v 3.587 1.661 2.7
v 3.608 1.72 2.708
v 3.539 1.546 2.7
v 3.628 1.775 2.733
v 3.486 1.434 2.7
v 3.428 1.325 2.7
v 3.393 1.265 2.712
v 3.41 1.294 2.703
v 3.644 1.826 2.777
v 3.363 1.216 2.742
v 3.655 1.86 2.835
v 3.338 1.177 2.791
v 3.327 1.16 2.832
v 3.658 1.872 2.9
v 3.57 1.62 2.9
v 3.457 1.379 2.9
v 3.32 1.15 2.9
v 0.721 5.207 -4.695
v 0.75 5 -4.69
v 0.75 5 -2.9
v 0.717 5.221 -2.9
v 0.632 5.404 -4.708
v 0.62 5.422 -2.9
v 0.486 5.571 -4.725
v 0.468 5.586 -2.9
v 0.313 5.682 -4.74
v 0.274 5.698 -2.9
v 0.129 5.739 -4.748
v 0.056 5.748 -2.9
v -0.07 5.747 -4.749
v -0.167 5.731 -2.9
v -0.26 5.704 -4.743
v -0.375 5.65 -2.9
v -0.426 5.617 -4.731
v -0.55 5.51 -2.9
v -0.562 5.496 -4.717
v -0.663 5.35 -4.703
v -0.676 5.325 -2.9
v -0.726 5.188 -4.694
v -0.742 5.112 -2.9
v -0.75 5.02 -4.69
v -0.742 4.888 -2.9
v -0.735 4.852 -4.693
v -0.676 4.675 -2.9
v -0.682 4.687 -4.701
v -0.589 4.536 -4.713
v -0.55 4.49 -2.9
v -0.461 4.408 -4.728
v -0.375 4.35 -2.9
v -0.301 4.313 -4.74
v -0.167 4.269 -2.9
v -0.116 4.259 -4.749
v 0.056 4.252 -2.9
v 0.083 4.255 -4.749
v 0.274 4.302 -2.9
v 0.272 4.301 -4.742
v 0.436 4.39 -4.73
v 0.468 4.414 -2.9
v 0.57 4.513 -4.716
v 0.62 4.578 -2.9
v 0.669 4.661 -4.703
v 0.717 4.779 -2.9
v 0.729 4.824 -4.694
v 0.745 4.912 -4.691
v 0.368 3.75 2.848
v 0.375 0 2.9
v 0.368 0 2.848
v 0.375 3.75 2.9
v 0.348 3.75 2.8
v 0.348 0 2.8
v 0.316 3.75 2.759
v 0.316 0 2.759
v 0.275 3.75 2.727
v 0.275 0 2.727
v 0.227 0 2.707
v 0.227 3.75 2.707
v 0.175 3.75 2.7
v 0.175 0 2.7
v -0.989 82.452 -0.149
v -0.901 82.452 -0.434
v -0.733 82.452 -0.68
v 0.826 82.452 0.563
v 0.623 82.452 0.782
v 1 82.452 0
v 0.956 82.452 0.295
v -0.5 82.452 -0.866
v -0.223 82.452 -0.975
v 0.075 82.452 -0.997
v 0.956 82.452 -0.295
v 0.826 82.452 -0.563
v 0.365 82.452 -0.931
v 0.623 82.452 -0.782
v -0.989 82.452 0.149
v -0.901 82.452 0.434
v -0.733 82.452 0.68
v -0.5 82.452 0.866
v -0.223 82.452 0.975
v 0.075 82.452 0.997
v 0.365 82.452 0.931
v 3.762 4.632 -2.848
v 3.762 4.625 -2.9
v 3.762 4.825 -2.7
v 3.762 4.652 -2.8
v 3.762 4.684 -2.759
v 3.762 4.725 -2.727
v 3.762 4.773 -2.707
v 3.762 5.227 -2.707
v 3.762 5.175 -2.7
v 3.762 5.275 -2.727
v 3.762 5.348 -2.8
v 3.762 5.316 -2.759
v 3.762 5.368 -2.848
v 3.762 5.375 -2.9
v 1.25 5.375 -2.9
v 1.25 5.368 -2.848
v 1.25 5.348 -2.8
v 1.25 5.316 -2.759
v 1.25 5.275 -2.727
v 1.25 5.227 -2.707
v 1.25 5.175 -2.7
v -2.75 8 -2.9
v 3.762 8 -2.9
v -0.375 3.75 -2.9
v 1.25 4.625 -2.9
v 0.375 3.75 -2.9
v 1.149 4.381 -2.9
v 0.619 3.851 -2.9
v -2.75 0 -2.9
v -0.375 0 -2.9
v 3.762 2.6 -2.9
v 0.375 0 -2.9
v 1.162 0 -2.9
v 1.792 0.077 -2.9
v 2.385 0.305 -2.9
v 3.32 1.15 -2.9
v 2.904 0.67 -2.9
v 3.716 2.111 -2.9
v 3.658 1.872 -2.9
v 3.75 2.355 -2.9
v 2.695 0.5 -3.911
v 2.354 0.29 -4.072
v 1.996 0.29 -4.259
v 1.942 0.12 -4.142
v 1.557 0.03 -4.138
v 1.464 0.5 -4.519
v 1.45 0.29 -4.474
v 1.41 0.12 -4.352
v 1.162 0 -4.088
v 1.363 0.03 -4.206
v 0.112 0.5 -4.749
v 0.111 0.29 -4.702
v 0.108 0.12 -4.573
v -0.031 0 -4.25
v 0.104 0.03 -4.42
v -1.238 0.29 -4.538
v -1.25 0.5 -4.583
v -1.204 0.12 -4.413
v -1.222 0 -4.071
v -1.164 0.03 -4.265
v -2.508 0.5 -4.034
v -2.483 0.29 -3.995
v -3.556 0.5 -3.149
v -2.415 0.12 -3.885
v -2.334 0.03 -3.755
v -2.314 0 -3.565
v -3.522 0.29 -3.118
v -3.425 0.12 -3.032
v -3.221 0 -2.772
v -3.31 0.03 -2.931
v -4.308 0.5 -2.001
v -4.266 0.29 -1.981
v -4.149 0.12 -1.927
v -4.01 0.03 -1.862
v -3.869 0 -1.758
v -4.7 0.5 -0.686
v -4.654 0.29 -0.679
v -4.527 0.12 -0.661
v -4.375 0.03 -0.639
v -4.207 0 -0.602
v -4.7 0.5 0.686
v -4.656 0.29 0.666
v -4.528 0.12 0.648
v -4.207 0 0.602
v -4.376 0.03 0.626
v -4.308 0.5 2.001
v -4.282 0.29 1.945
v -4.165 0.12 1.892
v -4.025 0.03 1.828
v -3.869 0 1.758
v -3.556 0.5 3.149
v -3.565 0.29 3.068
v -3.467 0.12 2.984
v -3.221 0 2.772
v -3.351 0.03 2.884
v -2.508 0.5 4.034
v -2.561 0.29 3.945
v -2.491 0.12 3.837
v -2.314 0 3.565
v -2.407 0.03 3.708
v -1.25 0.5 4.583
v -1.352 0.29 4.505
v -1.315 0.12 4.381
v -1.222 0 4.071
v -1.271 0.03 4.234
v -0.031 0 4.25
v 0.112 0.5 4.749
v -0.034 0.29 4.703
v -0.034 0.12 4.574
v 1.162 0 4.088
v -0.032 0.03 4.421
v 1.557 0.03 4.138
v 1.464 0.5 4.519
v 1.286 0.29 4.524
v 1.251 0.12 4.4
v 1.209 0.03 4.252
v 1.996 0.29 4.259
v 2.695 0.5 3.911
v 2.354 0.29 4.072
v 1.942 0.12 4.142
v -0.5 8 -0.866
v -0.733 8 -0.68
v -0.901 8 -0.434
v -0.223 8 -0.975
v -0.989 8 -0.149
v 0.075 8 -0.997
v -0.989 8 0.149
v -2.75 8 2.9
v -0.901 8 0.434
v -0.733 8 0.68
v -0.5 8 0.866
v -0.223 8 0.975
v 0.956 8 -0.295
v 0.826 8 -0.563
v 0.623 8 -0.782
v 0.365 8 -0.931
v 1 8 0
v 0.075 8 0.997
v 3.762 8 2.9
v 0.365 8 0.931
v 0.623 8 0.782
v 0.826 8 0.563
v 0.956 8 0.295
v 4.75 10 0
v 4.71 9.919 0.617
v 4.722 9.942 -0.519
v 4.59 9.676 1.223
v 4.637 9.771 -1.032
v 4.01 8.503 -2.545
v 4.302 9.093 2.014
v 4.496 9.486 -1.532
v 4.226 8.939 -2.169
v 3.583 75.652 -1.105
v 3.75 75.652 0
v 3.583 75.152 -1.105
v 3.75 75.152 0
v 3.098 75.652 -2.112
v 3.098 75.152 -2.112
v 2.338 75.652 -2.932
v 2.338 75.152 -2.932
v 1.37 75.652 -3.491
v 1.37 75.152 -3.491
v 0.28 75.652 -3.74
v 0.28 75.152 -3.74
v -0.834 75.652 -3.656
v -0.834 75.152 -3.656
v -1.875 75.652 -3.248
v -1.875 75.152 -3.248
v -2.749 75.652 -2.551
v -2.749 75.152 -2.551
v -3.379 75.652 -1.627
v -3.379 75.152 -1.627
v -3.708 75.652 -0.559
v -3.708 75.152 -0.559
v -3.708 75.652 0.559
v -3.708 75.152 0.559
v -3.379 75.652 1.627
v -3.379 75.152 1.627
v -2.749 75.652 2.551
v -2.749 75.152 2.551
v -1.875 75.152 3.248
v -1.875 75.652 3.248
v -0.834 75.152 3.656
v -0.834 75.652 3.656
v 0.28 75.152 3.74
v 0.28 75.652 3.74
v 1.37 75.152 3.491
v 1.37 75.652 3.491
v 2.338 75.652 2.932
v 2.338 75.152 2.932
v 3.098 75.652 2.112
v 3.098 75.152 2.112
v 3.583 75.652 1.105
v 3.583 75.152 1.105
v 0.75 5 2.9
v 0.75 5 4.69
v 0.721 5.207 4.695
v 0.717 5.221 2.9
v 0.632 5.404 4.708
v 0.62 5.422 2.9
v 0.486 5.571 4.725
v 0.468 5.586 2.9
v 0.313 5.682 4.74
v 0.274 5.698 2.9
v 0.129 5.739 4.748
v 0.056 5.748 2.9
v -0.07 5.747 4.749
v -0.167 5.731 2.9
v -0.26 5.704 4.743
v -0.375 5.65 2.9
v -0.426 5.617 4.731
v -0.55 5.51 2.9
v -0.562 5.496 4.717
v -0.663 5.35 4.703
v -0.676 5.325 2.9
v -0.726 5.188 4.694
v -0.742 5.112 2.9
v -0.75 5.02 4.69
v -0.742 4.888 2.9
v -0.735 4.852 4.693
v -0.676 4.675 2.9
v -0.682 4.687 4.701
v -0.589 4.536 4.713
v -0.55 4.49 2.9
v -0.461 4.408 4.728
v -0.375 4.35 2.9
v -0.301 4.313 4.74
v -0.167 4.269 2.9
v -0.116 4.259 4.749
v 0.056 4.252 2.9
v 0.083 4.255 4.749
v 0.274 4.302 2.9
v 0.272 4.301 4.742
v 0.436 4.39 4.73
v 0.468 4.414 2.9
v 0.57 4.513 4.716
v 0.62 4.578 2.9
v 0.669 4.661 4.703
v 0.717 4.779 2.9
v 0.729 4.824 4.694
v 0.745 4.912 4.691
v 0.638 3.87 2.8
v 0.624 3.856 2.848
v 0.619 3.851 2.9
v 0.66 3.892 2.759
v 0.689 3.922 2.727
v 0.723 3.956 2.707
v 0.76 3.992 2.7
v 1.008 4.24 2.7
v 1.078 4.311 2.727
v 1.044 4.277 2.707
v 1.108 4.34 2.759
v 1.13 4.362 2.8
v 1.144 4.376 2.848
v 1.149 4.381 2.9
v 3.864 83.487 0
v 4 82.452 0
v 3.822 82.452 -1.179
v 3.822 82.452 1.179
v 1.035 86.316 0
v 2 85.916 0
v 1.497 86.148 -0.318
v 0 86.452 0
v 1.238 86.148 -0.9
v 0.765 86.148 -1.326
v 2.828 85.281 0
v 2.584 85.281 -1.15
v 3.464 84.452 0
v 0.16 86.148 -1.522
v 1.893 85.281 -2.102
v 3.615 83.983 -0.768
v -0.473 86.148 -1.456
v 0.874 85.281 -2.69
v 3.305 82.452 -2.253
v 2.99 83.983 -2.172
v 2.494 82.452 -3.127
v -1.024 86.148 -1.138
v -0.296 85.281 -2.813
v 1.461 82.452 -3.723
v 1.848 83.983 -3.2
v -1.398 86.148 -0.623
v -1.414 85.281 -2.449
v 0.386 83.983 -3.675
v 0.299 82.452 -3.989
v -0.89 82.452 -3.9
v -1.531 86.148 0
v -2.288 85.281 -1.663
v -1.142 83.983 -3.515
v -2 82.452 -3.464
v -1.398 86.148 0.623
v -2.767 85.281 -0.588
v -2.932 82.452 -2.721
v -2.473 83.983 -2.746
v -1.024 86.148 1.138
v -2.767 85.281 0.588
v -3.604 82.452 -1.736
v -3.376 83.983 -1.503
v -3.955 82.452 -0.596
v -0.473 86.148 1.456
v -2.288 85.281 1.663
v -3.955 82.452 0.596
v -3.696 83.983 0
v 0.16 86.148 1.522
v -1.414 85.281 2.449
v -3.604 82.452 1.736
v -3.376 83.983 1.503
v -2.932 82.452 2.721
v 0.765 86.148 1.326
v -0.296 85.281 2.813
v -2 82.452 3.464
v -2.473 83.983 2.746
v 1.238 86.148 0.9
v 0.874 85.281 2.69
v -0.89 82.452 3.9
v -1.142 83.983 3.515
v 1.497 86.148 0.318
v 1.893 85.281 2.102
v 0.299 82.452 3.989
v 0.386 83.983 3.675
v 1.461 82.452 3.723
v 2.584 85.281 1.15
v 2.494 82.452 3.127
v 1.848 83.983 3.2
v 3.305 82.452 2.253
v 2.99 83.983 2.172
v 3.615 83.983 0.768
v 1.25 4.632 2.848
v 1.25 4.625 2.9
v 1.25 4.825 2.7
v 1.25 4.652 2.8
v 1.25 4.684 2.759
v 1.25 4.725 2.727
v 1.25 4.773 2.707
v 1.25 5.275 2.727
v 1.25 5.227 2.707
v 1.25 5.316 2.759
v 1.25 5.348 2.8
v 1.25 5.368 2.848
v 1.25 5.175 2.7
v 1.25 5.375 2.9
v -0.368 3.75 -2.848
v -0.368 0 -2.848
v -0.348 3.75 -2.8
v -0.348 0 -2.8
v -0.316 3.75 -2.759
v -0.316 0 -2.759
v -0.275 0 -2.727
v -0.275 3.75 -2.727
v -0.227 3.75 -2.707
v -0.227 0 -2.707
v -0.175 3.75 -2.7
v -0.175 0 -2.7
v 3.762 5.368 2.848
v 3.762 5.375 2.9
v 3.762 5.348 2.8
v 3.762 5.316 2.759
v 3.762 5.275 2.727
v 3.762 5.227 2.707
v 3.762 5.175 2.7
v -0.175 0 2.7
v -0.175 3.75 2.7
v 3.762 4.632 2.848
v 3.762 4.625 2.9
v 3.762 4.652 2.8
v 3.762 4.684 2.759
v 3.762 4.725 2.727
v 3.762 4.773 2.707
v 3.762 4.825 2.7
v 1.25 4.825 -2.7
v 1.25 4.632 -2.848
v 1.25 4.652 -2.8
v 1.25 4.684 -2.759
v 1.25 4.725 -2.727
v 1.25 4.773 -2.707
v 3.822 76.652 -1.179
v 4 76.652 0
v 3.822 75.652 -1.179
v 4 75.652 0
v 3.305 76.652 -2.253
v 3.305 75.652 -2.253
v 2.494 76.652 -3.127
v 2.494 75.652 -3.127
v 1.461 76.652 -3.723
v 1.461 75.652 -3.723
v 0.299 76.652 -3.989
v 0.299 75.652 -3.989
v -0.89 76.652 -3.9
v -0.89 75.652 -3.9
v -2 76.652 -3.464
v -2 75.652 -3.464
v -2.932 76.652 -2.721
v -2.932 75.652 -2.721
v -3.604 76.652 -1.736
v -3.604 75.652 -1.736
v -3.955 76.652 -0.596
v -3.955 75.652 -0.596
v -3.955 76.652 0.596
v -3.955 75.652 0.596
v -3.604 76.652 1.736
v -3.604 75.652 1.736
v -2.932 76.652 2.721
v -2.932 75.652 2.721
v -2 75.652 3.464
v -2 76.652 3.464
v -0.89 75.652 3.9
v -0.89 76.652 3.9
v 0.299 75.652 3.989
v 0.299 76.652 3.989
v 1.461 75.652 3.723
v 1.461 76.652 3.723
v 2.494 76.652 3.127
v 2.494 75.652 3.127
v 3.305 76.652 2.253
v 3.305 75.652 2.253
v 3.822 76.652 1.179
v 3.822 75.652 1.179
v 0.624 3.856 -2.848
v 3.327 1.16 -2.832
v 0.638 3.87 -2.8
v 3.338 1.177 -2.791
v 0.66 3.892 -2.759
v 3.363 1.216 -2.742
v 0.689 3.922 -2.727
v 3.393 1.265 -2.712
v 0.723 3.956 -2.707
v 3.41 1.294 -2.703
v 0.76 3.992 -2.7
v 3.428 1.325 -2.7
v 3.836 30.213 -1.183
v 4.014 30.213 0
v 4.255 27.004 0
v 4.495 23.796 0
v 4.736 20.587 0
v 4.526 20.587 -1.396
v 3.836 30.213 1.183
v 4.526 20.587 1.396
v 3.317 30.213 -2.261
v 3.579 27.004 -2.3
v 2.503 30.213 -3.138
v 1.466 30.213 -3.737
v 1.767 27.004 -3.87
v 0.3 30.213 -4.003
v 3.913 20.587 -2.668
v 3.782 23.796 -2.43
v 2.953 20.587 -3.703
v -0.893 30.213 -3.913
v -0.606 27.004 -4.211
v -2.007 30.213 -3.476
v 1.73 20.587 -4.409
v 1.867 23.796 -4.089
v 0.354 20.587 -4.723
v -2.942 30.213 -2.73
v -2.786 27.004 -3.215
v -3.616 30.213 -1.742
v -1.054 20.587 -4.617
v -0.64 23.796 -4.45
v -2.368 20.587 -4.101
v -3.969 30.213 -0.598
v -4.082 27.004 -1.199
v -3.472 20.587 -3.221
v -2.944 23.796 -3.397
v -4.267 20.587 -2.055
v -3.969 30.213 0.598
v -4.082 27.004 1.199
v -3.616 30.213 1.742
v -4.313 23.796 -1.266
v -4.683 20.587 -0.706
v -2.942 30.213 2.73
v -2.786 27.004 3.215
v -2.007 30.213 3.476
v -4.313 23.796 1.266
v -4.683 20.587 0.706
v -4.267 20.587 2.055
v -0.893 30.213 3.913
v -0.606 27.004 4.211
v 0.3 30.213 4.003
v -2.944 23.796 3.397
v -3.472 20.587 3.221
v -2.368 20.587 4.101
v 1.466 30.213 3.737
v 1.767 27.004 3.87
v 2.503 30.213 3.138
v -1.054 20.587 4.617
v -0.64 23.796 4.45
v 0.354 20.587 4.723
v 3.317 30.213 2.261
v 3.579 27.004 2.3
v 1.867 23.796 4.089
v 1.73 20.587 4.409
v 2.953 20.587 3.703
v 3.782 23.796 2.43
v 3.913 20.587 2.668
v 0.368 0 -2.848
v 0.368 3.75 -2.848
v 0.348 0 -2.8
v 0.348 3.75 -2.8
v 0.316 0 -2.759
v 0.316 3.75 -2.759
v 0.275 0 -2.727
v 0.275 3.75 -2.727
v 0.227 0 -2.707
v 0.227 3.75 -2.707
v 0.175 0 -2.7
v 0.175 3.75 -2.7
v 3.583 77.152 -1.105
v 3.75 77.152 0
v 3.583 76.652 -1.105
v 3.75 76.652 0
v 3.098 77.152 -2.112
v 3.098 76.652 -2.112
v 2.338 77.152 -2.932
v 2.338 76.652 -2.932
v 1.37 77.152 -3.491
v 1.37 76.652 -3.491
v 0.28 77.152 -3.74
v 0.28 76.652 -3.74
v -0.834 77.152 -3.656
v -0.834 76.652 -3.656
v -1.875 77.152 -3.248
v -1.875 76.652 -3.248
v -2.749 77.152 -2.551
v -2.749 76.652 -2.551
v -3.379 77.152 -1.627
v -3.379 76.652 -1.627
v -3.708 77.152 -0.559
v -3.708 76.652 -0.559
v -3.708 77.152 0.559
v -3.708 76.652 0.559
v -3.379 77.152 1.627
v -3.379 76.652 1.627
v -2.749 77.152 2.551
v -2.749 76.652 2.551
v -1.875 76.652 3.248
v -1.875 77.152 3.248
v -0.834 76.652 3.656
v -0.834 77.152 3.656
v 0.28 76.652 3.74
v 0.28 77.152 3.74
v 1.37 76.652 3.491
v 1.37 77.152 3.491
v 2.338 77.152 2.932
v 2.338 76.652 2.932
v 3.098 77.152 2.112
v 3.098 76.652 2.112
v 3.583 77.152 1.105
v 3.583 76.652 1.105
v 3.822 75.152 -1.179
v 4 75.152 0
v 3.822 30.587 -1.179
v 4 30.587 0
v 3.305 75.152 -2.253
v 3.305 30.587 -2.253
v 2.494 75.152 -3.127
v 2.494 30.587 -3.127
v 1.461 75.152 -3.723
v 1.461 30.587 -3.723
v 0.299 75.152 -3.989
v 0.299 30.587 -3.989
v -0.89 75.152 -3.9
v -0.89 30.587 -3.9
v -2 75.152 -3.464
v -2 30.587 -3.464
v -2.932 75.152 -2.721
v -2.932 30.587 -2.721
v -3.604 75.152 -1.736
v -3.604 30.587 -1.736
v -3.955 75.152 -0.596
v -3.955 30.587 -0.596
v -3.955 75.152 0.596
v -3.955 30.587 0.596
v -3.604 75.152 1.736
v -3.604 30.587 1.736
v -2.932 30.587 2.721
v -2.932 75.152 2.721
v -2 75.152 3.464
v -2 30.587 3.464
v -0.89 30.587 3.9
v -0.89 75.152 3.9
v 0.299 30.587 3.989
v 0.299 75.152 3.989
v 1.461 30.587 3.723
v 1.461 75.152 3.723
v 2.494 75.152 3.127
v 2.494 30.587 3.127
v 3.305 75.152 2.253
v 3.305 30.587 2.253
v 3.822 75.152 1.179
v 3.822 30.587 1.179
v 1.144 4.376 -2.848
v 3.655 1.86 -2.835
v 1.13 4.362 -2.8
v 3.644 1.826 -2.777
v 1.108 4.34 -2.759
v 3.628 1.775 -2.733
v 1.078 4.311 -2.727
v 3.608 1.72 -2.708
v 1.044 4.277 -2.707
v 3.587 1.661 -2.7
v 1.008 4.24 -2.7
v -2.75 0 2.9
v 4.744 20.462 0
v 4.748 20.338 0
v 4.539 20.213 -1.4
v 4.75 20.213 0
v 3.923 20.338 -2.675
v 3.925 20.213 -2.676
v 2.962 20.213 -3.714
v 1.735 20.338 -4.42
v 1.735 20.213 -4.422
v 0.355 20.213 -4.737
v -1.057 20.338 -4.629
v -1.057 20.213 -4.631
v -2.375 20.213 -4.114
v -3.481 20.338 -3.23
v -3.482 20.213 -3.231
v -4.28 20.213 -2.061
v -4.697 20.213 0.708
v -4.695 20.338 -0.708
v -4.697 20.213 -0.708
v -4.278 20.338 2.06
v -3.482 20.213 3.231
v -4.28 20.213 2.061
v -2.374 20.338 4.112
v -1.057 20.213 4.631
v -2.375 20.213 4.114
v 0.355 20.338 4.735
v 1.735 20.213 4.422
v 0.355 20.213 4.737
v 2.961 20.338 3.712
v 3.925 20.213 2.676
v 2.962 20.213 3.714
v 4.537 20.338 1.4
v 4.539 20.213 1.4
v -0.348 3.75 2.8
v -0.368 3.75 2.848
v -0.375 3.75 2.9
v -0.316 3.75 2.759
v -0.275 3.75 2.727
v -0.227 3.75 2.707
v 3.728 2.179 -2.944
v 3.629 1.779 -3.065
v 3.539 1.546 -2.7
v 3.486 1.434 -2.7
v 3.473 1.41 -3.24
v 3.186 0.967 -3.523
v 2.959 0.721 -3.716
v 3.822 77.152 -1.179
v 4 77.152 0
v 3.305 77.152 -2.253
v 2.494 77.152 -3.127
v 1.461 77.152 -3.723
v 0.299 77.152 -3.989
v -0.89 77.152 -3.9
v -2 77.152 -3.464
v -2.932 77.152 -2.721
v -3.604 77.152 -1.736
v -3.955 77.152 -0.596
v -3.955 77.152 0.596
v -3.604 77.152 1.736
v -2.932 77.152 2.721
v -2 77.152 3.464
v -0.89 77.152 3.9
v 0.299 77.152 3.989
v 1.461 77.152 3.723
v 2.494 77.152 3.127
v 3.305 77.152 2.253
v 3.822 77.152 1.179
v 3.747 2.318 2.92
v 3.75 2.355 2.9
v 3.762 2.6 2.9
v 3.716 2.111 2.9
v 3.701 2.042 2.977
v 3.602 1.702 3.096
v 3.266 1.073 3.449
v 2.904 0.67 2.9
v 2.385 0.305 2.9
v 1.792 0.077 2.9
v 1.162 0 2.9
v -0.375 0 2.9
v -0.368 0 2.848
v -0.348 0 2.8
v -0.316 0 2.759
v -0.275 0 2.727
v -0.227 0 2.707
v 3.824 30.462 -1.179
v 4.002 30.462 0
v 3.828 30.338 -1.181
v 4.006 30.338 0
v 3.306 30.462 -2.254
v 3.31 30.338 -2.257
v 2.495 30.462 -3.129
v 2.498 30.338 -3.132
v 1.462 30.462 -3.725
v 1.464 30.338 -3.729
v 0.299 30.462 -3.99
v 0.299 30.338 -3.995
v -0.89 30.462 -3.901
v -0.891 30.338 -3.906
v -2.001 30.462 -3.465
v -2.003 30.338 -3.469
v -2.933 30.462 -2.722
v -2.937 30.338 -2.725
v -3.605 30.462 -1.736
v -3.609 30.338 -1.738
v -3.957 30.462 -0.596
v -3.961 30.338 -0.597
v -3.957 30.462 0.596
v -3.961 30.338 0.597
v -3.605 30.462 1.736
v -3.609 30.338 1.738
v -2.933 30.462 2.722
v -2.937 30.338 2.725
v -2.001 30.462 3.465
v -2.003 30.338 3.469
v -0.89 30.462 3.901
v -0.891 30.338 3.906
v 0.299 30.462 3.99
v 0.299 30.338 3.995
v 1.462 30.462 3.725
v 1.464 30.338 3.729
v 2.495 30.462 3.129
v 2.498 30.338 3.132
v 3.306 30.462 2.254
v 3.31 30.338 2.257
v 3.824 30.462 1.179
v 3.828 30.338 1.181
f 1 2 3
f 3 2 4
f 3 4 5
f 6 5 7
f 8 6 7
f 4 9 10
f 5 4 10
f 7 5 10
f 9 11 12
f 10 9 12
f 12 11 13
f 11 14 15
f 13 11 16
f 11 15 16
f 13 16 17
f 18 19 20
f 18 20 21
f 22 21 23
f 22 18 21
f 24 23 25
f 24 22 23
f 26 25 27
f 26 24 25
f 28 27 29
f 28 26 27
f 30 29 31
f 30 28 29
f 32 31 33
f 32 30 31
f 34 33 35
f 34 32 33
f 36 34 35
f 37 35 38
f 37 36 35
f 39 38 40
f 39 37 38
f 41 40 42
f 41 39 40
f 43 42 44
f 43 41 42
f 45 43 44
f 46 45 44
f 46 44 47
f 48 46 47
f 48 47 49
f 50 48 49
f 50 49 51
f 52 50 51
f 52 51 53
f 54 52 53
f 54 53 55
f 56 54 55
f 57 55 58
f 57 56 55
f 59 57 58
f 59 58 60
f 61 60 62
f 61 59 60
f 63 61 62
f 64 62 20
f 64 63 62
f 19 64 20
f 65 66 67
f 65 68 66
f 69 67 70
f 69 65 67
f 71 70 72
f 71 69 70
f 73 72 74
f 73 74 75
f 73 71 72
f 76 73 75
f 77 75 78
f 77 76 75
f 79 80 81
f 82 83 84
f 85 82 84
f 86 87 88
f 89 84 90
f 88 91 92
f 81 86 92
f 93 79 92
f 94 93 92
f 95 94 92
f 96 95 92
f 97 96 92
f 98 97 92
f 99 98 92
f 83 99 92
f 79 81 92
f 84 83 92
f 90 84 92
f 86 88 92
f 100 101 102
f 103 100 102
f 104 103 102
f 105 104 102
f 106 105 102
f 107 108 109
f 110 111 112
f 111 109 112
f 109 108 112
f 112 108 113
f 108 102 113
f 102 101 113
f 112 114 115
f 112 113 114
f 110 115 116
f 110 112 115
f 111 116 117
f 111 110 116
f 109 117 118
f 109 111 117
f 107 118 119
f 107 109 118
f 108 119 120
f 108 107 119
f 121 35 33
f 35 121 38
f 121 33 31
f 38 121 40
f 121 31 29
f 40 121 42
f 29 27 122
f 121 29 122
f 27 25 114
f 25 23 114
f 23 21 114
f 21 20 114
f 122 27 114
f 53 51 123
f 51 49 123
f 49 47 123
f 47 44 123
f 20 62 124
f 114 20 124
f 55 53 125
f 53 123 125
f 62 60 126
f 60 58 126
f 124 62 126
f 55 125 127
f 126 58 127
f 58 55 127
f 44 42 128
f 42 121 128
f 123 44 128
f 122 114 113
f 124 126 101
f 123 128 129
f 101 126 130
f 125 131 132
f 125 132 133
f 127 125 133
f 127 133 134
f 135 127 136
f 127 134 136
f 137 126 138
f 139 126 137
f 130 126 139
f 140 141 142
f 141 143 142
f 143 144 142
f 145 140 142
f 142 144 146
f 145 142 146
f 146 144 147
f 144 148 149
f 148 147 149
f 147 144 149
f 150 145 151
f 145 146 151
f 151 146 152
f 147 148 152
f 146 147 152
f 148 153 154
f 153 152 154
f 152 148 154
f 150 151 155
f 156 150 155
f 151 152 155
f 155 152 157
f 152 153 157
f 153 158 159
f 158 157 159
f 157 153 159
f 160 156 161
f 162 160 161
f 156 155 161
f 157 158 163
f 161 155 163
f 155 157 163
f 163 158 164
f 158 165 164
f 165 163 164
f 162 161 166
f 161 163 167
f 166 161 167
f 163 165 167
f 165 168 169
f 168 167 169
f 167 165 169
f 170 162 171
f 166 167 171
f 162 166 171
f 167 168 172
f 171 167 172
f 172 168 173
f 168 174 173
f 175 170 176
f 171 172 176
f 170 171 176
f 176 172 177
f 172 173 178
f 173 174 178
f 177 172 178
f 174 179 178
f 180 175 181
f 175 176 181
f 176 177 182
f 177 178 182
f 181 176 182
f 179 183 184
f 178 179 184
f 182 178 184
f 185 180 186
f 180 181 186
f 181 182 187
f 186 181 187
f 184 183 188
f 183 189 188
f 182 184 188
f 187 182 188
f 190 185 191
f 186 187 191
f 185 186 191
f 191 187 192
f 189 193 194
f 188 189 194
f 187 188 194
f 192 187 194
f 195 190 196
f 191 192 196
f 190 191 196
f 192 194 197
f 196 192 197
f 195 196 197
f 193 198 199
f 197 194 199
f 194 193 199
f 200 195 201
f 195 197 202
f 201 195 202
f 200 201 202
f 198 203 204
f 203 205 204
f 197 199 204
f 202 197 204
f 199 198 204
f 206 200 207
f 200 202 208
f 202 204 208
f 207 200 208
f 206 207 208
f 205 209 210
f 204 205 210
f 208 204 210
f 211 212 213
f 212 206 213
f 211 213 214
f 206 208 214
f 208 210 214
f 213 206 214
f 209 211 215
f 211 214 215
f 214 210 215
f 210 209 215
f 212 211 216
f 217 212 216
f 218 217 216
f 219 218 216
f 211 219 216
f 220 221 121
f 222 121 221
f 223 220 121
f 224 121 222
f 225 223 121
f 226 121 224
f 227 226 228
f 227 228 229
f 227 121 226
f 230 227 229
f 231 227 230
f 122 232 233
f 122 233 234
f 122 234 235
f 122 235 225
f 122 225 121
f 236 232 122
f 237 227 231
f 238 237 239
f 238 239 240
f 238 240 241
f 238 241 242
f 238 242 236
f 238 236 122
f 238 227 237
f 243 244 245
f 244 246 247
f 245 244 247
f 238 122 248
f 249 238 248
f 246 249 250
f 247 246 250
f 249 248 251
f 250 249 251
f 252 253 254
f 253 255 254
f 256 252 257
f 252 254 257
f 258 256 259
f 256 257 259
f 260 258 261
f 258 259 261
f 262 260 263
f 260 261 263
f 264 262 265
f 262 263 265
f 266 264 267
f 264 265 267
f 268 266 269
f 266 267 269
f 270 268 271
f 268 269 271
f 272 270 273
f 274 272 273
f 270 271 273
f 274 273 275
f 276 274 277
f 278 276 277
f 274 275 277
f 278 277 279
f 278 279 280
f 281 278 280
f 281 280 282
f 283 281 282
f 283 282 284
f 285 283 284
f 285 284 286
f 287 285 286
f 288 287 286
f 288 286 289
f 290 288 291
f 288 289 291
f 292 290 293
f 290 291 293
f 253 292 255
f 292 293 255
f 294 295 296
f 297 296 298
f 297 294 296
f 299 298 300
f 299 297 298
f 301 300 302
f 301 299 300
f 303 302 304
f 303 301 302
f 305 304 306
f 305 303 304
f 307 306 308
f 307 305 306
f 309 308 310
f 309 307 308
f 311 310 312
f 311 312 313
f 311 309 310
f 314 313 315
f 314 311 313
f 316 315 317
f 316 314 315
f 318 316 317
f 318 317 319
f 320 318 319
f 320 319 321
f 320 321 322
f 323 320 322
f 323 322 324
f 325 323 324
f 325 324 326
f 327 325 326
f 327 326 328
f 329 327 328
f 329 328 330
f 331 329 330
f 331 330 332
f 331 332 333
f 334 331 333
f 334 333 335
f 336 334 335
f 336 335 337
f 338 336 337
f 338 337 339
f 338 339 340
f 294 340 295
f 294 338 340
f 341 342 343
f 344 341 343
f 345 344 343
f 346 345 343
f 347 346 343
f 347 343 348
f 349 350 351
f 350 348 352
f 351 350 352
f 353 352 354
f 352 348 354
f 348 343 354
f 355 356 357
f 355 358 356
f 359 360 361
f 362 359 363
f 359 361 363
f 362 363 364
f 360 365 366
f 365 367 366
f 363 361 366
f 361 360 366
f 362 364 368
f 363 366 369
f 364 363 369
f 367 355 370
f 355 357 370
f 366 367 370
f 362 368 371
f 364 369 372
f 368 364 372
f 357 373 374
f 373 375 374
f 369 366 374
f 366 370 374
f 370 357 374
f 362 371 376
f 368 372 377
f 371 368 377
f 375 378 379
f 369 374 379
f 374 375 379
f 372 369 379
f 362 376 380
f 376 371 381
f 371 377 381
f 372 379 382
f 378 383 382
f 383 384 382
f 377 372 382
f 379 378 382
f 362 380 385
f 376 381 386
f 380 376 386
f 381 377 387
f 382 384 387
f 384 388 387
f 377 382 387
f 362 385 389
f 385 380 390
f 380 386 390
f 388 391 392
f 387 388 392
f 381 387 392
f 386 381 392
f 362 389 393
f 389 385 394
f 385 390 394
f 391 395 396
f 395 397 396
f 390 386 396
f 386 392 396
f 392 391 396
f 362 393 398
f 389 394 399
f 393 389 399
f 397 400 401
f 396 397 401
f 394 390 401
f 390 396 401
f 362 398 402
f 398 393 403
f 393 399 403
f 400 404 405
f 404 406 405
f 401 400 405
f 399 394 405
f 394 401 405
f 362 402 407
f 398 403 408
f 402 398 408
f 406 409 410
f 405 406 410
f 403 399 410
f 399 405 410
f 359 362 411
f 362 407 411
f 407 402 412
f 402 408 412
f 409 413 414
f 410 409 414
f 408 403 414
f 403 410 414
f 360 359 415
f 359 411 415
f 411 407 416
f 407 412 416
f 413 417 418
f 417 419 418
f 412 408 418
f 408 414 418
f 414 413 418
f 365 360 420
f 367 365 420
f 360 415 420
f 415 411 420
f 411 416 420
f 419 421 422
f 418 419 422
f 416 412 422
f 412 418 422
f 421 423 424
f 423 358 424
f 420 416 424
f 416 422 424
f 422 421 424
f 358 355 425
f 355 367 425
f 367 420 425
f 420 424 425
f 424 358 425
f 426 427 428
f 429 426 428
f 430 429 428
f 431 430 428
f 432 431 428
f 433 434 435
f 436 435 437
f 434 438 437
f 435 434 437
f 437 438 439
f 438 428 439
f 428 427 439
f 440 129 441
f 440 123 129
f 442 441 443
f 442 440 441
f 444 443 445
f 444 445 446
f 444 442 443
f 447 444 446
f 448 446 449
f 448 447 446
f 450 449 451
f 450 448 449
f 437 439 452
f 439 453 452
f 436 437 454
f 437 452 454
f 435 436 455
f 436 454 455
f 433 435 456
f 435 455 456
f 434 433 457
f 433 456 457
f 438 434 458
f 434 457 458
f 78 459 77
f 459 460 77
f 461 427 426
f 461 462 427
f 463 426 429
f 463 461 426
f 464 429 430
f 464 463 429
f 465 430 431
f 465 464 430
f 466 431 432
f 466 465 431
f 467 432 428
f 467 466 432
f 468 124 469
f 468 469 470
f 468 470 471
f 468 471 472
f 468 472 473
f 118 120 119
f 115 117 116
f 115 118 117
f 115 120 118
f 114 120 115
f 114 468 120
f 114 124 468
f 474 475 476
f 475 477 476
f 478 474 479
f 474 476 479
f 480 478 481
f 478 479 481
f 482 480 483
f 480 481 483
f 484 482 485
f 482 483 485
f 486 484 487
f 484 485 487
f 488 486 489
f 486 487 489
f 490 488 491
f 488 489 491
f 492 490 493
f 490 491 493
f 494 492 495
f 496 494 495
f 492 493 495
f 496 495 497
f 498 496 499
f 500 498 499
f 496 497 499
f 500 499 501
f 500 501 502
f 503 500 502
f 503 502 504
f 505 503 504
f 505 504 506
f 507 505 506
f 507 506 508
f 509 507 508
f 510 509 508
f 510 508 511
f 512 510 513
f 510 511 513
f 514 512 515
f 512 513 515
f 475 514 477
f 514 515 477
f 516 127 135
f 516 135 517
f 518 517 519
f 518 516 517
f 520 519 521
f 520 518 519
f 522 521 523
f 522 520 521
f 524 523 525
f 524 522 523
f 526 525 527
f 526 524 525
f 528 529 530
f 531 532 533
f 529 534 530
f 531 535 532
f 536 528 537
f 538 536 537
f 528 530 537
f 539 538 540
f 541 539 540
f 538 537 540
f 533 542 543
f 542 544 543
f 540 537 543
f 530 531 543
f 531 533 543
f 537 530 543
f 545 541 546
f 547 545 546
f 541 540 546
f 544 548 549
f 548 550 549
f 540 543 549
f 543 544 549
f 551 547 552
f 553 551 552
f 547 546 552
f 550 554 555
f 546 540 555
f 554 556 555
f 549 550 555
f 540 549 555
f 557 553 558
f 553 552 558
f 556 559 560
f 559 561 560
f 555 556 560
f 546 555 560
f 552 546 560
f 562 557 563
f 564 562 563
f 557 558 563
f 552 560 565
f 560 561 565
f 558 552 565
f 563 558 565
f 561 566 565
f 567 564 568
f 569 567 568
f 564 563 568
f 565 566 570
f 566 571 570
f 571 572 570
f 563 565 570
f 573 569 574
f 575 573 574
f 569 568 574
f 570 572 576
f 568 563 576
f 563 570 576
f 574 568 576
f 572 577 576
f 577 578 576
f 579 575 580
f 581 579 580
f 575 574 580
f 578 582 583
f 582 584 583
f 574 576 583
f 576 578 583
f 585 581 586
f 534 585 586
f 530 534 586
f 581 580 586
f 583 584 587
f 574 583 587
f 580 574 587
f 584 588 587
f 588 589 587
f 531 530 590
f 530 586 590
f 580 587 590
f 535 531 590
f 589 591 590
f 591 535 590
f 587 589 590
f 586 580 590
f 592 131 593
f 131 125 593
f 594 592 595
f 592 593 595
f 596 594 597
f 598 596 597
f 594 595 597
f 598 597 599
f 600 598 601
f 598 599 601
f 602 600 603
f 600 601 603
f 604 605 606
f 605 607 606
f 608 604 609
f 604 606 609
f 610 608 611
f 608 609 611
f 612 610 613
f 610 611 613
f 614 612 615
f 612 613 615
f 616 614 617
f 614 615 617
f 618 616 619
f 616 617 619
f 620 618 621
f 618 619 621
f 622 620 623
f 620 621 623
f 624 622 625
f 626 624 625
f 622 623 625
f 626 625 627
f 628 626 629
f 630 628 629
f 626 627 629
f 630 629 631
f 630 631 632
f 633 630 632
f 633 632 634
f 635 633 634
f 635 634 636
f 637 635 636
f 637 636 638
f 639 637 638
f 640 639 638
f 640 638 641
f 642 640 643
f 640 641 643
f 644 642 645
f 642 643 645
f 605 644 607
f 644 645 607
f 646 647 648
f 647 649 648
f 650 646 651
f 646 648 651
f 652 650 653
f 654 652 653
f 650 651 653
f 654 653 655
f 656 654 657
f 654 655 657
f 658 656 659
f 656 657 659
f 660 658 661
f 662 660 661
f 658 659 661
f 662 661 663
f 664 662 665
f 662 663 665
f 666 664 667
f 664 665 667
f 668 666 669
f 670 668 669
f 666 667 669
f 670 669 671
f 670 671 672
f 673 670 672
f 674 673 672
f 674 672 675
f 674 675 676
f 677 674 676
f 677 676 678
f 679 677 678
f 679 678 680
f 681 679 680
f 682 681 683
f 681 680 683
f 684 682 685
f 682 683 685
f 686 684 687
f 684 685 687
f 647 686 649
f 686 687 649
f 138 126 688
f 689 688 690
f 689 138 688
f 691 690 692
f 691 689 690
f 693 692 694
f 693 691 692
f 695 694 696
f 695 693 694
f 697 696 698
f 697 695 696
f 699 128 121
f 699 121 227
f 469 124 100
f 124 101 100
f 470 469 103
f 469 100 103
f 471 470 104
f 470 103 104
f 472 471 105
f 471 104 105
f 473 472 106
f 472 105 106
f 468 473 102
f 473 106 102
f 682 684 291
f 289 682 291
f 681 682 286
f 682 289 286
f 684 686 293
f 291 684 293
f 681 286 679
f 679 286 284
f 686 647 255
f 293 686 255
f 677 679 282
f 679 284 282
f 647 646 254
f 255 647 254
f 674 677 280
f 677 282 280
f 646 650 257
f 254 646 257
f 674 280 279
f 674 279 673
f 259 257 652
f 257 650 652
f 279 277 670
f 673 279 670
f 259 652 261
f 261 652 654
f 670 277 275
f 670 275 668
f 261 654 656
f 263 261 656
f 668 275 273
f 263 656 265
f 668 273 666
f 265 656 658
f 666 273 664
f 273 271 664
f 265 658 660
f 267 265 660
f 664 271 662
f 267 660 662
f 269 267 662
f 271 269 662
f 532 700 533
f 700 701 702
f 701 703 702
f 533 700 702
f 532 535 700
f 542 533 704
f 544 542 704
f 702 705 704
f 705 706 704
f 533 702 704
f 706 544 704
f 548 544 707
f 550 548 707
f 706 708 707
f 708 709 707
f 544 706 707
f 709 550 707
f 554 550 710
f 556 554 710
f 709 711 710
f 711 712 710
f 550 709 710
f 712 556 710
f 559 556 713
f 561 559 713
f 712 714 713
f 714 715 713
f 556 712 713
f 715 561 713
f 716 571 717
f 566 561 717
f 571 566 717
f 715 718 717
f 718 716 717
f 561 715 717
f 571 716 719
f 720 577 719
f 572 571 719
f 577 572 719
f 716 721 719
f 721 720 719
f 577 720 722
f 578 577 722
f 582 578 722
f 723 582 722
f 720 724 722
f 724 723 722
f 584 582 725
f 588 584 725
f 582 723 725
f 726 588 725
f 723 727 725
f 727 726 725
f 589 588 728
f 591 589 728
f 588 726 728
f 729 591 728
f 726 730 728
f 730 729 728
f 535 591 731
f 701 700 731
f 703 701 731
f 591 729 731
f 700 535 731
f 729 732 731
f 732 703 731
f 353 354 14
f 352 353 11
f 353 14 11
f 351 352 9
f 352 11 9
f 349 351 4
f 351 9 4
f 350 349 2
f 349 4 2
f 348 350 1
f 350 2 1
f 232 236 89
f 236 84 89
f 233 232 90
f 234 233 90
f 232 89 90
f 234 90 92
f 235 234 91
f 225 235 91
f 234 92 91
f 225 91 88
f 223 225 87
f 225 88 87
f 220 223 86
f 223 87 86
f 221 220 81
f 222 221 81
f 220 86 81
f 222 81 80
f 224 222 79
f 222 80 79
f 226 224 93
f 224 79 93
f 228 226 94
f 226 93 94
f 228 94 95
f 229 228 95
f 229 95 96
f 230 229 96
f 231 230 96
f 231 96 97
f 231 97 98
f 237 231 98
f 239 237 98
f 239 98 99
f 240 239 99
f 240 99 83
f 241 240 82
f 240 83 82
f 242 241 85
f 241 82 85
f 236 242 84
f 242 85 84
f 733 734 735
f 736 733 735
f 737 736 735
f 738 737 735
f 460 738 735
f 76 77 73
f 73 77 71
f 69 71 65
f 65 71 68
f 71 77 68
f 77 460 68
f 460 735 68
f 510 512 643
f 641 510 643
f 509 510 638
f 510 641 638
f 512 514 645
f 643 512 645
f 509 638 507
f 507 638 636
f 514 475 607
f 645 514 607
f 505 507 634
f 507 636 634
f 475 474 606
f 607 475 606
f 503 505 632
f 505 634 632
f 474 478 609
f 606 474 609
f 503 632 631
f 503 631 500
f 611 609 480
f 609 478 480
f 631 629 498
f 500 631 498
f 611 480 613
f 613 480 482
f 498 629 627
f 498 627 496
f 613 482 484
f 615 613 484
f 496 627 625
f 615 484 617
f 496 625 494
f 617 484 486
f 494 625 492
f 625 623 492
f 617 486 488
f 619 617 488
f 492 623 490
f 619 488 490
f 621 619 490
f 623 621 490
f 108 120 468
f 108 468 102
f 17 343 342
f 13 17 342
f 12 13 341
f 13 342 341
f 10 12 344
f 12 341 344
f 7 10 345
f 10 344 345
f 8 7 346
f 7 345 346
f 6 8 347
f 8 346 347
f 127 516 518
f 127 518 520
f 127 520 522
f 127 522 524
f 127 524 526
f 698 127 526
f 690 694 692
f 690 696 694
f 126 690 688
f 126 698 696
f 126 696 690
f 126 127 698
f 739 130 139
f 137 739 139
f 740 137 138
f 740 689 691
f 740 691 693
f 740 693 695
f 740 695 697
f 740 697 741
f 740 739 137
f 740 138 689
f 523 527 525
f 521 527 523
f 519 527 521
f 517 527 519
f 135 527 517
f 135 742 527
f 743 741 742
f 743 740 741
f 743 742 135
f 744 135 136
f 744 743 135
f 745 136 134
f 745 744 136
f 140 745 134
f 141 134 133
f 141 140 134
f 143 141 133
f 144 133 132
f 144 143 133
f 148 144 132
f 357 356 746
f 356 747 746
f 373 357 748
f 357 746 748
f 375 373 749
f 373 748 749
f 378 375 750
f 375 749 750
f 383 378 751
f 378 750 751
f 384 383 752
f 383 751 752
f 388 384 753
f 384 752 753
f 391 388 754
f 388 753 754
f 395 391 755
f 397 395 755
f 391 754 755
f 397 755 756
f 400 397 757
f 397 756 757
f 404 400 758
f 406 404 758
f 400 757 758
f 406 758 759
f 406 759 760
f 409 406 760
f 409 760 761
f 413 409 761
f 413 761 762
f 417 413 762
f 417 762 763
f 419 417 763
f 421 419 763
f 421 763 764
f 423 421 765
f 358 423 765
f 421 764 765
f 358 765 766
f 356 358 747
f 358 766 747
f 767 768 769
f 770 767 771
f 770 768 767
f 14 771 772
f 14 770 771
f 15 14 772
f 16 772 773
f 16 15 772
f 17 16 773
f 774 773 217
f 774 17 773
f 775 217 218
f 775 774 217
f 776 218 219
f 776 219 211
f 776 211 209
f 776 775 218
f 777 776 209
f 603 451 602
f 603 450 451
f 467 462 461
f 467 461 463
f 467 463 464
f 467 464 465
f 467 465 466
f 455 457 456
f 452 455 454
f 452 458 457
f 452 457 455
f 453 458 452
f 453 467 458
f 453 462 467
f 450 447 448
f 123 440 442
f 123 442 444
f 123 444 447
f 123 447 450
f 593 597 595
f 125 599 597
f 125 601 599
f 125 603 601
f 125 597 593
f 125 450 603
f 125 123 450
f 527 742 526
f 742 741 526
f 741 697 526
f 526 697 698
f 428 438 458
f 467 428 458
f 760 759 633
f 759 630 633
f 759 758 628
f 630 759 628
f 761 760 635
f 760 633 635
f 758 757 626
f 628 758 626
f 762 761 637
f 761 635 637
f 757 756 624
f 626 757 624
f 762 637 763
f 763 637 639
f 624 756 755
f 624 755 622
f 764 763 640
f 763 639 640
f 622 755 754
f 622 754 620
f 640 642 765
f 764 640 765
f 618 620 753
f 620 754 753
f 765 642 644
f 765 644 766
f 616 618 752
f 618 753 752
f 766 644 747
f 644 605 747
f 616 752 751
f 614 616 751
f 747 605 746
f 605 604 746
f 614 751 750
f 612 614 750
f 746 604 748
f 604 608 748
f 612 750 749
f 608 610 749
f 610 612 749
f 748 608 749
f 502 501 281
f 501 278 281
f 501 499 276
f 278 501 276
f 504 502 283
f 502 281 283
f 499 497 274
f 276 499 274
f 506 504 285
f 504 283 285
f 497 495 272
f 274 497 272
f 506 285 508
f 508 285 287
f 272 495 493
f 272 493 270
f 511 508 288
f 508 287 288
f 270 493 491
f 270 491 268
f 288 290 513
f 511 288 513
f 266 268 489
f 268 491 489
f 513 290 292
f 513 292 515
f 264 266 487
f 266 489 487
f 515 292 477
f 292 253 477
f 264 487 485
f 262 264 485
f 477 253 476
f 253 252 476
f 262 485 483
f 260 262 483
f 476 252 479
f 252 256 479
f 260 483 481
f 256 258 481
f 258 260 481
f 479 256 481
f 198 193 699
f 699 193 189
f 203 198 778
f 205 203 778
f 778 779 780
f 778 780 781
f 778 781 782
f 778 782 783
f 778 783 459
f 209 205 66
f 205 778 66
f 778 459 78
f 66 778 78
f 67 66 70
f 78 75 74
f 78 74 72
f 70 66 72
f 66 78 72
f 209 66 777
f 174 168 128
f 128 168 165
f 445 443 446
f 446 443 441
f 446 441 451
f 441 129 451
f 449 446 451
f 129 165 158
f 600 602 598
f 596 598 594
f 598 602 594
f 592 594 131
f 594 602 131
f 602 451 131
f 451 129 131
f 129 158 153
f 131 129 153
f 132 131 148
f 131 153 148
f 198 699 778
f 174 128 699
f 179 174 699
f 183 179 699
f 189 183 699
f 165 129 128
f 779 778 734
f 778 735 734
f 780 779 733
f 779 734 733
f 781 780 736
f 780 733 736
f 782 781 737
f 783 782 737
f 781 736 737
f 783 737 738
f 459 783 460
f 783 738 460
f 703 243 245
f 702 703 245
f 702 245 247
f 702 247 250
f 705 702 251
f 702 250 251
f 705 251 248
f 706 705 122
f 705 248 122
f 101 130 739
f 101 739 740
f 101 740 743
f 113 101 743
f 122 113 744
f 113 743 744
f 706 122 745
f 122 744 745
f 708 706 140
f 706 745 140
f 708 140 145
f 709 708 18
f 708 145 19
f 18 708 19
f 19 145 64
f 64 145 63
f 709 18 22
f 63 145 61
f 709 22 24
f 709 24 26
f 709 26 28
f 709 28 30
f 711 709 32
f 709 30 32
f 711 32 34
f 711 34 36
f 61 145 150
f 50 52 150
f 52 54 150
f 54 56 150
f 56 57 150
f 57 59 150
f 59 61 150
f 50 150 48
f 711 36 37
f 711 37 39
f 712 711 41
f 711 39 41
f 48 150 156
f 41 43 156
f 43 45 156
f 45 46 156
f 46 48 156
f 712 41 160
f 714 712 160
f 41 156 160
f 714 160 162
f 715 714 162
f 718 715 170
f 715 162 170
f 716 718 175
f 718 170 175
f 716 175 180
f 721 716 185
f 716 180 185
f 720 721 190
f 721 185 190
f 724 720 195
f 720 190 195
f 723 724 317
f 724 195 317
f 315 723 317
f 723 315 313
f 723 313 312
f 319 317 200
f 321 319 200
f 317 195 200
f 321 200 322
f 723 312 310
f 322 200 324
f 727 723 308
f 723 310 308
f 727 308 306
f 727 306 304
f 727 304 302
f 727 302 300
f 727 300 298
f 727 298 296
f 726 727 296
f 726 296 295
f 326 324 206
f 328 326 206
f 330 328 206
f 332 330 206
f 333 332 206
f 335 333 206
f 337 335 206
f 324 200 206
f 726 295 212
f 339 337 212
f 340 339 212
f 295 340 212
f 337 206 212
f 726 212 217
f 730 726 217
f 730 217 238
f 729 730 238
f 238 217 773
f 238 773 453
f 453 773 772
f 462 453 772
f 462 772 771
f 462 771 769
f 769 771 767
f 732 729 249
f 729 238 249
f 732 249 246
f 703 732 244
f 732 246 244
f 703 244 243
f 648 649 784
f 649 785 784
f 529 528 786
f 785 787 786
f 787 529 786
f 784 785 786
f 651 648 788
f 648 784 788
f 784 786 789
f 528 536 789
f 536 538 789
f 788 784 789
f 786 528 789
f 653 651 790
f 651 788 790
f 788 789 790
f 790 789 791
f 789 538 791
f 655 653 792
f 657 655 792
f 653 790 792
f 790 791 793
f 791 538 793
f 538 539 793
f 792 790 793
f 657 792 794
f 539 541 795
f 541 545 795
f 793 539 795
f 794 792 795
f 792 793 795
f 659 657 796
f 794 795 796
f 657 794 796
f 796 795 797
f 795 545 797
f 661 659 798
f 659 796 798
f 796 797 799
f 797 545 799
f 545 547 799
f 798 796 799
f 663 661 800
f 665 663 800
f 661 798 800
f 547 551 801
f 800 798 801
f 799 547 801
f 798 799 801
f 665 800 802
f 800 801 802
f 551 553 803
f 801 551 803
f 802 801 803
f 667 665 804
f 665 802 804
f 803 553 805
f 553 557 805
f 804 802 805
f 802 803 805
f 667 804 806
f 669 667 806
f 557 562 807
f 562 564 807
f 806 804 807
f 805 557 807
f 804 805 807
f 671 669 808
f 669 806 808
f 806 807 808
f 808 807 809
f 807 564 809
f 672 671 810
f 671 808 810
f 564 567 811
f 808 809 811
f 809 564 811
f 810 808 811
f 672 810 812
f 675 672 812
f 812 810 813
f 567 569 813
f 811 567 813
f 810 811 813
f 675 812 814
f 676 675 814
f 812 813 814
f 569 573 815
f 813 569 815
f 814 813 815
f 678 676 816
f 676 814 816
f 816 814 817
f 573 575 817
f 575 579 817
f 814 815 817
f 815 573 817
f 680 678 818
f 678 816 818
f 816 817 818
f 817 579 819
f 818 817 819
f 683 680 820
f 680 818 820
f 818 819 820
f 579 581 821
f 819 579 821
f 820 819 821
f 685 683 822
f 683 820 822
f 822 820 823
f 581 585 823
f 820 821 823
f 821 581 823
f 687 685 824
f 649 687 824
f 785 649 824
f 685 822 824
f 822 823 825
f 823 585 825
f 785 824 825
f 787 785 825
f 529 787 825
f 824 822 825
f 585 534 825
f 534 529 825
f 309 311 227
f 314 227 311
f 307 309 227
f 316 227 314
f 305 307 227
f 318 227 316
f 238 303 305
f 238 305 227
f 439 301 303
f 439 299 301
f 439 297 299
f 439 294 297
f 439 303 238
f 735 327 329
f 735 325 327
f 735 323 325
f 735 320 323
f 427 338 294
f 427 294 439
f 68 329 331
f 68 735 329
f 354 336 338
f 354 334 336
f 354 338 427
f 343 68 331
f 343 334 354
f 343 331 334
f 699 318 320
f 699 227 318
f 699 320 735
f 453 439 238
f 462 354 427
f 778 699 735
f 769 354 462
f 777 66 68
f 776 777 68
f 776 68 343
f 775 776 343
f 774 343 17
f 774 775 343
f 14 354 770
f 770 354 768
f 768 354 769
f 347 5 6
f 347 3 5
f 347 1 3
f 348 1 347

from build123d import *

# Parameters (mm, degrees)
ESQUISSE3_W                  = 7.5
ESQUISSE3_H                  = 5.8
ENL_V_MAT_EXTRU_1_DEPTH      = 8
CONG_1_R                     = 0.5
ENL_V_MAT_EXTRU_2_DEPTH      = 87.712791632
ENL_V_MAT_EXTRU_2_DEPTH_BACK = 87.712791632
ESQUISSE4_R                  = 0.75
ESQUISSE5_W                  = 0.75
ESQUISSE5_H                  = 3.75
ESQUISSE5_W_2                = 2.511980861
ESQUISSE5_H_2                = 0.75
BOSS_EXTRU_1_DEPTH           = 0.2
CONG_2_R                     = 0.2
CONG_2_OF_SYM_TRIE1_R        = 0.2
ENL_V_MAT_EXTRU_3_DEPTH      = 87.919895497


with BuildPart() as part:
    # Esquisse2 → Révolution1 (revolve)
    with BuildSketch(Plane.XY):
        with BuildLine():
            Line((4.014003451, 30.213287326), (4.735996549, 20.586712674))
            ThreePointArc((4.735996549, 20.586712674), (4.746497911, 20.399868856), (4.75, 20.212762933))
            Line((4.75, 20.212762933), (4.75, 0))
            Line((4.75, 0), (1, 0))
            Line((1, 0), (1, 82.452202))
            Line((1, 82.452202), (0, 82.452202))
            Line((0, 82.452202), (0, 86.452202))
            ThreePointArc((0, 86.452202), (2.828427125, 85.280629125), (4, 82.452202))
            Line((4, 82.452202), (4, 77.152202))
            Line((4, 77.152202), (3.75, 77.152202))
            Line((3.75, 77.152202), (3.75, 76.652202))
            Line((3.75, 76.652202), (4, 76.652202))
            Line((4, 76.652202), (4, 75.652202))
            Line((4, 75.652202), (3.75, 75.652202))
            Line((3.75, 75.652202), (3.75, 75.152202))
            Line((3.75, 75.152202), (4, 75.152202))
            Line((4, 75.152202), (4, 30.587237067))
            ThreePointArc((4, 30.587237067), (4.003502089, 30.400131144), (4.014003451, 30.213287326))
        make_face()
    revolve(axis=Axis((0, 0, 0), (0, 1, 0)))

    # Esquisse3 → Enlèv. mat.-Extru.1 (cut)
    with BuildSketch(Plane.XZ):
        with Locations((1, 0)):
            Rectangle(ESQUISSE3_W, ESQUISSE3_H)
    extrude(amount=-ENL_V_MAT_EXTRU_1_DEPTH, mode=Mode.SUBTRACT)

    # Congé1
    cong_1_edges = [part.edges().sort_by_distance(p)[0] for p in [
        (-4.75, 0, 0),
    ]]
    fillet(cong_1_edges, radius=CONG_1_R)

    # Esquisse4 → Enlèv. mat.-Extru.2 (cut, two sides: drawn at the far end of the back side and taken through both)
    with BuildSketch(Plane.XY.offset(-ENL_V_MAT_EXTRU_2_DEPTH_BACK)):
        with Locations((0, 5)):
            Circle(ESQUISSE4_R)
        with BuildLine():
            Line((1.161980861, 0), (3.761980861, 0))
            Line((3.761980861, 0), (3.761980861, 2.6))
            ThreePointArc((3.761980861, 2.6), (3.000458492, 0.761522369), (1.161980861, 0))
        make_face()
        Polygon((3.761980861, 8), (4.75, 10), (4.75, 8), align=None)
    extrude(amount=ENL_V_MAT_EXTRU_2_DEPTH + ENL_V_MAT_EXTRU_2_DEPTH_BACK, mode=Mode.SUBTRACT)

    # Esquisse5 → Boss.-Extru.1 (add)
    with BuildSketch(Plane.XY.offset(-2.9)):
        with Locations((0, 1.875)):
            Rectangle(ESQUISSE5_W, ESQUISSE5_H)
        Polygon((0.618718434, 3.850951481), (1.149048519, 4.381281566), (4.027145904, 1.503184182), (3.496815818, 0.972854096), align=None)
        with Locations((2.50599043, 5)):
            Rectangle(ESQUISSE5_W_2, ESQUISSE5_H_2)
    boss_extru_1 = extrude(amount=BOSS_EXTRU_1_DEPTH)

    # Congé2
    cong_2_edges = [part.edges().sort_by_distance(p)[0] for p in [
        (2.505990431, 5.375, -2.7),
        (2.505990431, 4.625, -2.7),
        (2.588097212, 2.942232874, -2.7),
        (2.057767126, 2.411902788, -2.7),
        (-0.375, 1.875, -2.7),
        (0.375, 1.875, -2.7),
    ]]
    fillet(cong_2_edges, radius=CONG_2_R - 0.0001)  # a hair under: the kernel refuses the full size

    # Symétrie1: Boss.-Extru.1 across plane
    add(boss_extru_1.mirror(Plane.XY))

    # Congé2 of Symétrie1
    cong_2_of_sym_trie1_edges = [part.edges().sort_by_distance(p)[0] for p in [
        (2.505990431, 5.375, 2.7),
        (2.505990431, 4.625, 2.7),
        (2.588097212, 2.942232874, 2.7),
        (2.057767126, 2.411902788, 2.7),
        (-0.375, 1.875, 2.7),
        (0.375, 1.875, 2.7),
    ]]
    fillet(cong_2_of_sym_trie1_edges, radius=CONG_2_OF_SYM_TRIE1_R - 0.0001)  # a hair under: the kernel refuses the full size

    # Esquisse6 → Enlèv. mat.-Extru.3 (cut, through all)
    with BuildSketch(Plane.XY.offset(2.9)):
        with BuildLine():
            Line((4.027145904, 1.503184182), (3.658059706, 1.87227038))
            ThreePointArc((3.658059706, 1.87227038), (3.516870908, 1.49795968), (3.319930166, 1.149739748))
            Line((3.319930166, 1.149739748), (3.496815818, 0.972854096))
            Line((3.496815818, 0.972854096), (4.027145904, 1.503184182))
        make_face()
    extrude(amount=-ENL_V_MAT_EXTRU_3_DEPTH, mode=Mode.SUBTRACT)


solid = part.part
